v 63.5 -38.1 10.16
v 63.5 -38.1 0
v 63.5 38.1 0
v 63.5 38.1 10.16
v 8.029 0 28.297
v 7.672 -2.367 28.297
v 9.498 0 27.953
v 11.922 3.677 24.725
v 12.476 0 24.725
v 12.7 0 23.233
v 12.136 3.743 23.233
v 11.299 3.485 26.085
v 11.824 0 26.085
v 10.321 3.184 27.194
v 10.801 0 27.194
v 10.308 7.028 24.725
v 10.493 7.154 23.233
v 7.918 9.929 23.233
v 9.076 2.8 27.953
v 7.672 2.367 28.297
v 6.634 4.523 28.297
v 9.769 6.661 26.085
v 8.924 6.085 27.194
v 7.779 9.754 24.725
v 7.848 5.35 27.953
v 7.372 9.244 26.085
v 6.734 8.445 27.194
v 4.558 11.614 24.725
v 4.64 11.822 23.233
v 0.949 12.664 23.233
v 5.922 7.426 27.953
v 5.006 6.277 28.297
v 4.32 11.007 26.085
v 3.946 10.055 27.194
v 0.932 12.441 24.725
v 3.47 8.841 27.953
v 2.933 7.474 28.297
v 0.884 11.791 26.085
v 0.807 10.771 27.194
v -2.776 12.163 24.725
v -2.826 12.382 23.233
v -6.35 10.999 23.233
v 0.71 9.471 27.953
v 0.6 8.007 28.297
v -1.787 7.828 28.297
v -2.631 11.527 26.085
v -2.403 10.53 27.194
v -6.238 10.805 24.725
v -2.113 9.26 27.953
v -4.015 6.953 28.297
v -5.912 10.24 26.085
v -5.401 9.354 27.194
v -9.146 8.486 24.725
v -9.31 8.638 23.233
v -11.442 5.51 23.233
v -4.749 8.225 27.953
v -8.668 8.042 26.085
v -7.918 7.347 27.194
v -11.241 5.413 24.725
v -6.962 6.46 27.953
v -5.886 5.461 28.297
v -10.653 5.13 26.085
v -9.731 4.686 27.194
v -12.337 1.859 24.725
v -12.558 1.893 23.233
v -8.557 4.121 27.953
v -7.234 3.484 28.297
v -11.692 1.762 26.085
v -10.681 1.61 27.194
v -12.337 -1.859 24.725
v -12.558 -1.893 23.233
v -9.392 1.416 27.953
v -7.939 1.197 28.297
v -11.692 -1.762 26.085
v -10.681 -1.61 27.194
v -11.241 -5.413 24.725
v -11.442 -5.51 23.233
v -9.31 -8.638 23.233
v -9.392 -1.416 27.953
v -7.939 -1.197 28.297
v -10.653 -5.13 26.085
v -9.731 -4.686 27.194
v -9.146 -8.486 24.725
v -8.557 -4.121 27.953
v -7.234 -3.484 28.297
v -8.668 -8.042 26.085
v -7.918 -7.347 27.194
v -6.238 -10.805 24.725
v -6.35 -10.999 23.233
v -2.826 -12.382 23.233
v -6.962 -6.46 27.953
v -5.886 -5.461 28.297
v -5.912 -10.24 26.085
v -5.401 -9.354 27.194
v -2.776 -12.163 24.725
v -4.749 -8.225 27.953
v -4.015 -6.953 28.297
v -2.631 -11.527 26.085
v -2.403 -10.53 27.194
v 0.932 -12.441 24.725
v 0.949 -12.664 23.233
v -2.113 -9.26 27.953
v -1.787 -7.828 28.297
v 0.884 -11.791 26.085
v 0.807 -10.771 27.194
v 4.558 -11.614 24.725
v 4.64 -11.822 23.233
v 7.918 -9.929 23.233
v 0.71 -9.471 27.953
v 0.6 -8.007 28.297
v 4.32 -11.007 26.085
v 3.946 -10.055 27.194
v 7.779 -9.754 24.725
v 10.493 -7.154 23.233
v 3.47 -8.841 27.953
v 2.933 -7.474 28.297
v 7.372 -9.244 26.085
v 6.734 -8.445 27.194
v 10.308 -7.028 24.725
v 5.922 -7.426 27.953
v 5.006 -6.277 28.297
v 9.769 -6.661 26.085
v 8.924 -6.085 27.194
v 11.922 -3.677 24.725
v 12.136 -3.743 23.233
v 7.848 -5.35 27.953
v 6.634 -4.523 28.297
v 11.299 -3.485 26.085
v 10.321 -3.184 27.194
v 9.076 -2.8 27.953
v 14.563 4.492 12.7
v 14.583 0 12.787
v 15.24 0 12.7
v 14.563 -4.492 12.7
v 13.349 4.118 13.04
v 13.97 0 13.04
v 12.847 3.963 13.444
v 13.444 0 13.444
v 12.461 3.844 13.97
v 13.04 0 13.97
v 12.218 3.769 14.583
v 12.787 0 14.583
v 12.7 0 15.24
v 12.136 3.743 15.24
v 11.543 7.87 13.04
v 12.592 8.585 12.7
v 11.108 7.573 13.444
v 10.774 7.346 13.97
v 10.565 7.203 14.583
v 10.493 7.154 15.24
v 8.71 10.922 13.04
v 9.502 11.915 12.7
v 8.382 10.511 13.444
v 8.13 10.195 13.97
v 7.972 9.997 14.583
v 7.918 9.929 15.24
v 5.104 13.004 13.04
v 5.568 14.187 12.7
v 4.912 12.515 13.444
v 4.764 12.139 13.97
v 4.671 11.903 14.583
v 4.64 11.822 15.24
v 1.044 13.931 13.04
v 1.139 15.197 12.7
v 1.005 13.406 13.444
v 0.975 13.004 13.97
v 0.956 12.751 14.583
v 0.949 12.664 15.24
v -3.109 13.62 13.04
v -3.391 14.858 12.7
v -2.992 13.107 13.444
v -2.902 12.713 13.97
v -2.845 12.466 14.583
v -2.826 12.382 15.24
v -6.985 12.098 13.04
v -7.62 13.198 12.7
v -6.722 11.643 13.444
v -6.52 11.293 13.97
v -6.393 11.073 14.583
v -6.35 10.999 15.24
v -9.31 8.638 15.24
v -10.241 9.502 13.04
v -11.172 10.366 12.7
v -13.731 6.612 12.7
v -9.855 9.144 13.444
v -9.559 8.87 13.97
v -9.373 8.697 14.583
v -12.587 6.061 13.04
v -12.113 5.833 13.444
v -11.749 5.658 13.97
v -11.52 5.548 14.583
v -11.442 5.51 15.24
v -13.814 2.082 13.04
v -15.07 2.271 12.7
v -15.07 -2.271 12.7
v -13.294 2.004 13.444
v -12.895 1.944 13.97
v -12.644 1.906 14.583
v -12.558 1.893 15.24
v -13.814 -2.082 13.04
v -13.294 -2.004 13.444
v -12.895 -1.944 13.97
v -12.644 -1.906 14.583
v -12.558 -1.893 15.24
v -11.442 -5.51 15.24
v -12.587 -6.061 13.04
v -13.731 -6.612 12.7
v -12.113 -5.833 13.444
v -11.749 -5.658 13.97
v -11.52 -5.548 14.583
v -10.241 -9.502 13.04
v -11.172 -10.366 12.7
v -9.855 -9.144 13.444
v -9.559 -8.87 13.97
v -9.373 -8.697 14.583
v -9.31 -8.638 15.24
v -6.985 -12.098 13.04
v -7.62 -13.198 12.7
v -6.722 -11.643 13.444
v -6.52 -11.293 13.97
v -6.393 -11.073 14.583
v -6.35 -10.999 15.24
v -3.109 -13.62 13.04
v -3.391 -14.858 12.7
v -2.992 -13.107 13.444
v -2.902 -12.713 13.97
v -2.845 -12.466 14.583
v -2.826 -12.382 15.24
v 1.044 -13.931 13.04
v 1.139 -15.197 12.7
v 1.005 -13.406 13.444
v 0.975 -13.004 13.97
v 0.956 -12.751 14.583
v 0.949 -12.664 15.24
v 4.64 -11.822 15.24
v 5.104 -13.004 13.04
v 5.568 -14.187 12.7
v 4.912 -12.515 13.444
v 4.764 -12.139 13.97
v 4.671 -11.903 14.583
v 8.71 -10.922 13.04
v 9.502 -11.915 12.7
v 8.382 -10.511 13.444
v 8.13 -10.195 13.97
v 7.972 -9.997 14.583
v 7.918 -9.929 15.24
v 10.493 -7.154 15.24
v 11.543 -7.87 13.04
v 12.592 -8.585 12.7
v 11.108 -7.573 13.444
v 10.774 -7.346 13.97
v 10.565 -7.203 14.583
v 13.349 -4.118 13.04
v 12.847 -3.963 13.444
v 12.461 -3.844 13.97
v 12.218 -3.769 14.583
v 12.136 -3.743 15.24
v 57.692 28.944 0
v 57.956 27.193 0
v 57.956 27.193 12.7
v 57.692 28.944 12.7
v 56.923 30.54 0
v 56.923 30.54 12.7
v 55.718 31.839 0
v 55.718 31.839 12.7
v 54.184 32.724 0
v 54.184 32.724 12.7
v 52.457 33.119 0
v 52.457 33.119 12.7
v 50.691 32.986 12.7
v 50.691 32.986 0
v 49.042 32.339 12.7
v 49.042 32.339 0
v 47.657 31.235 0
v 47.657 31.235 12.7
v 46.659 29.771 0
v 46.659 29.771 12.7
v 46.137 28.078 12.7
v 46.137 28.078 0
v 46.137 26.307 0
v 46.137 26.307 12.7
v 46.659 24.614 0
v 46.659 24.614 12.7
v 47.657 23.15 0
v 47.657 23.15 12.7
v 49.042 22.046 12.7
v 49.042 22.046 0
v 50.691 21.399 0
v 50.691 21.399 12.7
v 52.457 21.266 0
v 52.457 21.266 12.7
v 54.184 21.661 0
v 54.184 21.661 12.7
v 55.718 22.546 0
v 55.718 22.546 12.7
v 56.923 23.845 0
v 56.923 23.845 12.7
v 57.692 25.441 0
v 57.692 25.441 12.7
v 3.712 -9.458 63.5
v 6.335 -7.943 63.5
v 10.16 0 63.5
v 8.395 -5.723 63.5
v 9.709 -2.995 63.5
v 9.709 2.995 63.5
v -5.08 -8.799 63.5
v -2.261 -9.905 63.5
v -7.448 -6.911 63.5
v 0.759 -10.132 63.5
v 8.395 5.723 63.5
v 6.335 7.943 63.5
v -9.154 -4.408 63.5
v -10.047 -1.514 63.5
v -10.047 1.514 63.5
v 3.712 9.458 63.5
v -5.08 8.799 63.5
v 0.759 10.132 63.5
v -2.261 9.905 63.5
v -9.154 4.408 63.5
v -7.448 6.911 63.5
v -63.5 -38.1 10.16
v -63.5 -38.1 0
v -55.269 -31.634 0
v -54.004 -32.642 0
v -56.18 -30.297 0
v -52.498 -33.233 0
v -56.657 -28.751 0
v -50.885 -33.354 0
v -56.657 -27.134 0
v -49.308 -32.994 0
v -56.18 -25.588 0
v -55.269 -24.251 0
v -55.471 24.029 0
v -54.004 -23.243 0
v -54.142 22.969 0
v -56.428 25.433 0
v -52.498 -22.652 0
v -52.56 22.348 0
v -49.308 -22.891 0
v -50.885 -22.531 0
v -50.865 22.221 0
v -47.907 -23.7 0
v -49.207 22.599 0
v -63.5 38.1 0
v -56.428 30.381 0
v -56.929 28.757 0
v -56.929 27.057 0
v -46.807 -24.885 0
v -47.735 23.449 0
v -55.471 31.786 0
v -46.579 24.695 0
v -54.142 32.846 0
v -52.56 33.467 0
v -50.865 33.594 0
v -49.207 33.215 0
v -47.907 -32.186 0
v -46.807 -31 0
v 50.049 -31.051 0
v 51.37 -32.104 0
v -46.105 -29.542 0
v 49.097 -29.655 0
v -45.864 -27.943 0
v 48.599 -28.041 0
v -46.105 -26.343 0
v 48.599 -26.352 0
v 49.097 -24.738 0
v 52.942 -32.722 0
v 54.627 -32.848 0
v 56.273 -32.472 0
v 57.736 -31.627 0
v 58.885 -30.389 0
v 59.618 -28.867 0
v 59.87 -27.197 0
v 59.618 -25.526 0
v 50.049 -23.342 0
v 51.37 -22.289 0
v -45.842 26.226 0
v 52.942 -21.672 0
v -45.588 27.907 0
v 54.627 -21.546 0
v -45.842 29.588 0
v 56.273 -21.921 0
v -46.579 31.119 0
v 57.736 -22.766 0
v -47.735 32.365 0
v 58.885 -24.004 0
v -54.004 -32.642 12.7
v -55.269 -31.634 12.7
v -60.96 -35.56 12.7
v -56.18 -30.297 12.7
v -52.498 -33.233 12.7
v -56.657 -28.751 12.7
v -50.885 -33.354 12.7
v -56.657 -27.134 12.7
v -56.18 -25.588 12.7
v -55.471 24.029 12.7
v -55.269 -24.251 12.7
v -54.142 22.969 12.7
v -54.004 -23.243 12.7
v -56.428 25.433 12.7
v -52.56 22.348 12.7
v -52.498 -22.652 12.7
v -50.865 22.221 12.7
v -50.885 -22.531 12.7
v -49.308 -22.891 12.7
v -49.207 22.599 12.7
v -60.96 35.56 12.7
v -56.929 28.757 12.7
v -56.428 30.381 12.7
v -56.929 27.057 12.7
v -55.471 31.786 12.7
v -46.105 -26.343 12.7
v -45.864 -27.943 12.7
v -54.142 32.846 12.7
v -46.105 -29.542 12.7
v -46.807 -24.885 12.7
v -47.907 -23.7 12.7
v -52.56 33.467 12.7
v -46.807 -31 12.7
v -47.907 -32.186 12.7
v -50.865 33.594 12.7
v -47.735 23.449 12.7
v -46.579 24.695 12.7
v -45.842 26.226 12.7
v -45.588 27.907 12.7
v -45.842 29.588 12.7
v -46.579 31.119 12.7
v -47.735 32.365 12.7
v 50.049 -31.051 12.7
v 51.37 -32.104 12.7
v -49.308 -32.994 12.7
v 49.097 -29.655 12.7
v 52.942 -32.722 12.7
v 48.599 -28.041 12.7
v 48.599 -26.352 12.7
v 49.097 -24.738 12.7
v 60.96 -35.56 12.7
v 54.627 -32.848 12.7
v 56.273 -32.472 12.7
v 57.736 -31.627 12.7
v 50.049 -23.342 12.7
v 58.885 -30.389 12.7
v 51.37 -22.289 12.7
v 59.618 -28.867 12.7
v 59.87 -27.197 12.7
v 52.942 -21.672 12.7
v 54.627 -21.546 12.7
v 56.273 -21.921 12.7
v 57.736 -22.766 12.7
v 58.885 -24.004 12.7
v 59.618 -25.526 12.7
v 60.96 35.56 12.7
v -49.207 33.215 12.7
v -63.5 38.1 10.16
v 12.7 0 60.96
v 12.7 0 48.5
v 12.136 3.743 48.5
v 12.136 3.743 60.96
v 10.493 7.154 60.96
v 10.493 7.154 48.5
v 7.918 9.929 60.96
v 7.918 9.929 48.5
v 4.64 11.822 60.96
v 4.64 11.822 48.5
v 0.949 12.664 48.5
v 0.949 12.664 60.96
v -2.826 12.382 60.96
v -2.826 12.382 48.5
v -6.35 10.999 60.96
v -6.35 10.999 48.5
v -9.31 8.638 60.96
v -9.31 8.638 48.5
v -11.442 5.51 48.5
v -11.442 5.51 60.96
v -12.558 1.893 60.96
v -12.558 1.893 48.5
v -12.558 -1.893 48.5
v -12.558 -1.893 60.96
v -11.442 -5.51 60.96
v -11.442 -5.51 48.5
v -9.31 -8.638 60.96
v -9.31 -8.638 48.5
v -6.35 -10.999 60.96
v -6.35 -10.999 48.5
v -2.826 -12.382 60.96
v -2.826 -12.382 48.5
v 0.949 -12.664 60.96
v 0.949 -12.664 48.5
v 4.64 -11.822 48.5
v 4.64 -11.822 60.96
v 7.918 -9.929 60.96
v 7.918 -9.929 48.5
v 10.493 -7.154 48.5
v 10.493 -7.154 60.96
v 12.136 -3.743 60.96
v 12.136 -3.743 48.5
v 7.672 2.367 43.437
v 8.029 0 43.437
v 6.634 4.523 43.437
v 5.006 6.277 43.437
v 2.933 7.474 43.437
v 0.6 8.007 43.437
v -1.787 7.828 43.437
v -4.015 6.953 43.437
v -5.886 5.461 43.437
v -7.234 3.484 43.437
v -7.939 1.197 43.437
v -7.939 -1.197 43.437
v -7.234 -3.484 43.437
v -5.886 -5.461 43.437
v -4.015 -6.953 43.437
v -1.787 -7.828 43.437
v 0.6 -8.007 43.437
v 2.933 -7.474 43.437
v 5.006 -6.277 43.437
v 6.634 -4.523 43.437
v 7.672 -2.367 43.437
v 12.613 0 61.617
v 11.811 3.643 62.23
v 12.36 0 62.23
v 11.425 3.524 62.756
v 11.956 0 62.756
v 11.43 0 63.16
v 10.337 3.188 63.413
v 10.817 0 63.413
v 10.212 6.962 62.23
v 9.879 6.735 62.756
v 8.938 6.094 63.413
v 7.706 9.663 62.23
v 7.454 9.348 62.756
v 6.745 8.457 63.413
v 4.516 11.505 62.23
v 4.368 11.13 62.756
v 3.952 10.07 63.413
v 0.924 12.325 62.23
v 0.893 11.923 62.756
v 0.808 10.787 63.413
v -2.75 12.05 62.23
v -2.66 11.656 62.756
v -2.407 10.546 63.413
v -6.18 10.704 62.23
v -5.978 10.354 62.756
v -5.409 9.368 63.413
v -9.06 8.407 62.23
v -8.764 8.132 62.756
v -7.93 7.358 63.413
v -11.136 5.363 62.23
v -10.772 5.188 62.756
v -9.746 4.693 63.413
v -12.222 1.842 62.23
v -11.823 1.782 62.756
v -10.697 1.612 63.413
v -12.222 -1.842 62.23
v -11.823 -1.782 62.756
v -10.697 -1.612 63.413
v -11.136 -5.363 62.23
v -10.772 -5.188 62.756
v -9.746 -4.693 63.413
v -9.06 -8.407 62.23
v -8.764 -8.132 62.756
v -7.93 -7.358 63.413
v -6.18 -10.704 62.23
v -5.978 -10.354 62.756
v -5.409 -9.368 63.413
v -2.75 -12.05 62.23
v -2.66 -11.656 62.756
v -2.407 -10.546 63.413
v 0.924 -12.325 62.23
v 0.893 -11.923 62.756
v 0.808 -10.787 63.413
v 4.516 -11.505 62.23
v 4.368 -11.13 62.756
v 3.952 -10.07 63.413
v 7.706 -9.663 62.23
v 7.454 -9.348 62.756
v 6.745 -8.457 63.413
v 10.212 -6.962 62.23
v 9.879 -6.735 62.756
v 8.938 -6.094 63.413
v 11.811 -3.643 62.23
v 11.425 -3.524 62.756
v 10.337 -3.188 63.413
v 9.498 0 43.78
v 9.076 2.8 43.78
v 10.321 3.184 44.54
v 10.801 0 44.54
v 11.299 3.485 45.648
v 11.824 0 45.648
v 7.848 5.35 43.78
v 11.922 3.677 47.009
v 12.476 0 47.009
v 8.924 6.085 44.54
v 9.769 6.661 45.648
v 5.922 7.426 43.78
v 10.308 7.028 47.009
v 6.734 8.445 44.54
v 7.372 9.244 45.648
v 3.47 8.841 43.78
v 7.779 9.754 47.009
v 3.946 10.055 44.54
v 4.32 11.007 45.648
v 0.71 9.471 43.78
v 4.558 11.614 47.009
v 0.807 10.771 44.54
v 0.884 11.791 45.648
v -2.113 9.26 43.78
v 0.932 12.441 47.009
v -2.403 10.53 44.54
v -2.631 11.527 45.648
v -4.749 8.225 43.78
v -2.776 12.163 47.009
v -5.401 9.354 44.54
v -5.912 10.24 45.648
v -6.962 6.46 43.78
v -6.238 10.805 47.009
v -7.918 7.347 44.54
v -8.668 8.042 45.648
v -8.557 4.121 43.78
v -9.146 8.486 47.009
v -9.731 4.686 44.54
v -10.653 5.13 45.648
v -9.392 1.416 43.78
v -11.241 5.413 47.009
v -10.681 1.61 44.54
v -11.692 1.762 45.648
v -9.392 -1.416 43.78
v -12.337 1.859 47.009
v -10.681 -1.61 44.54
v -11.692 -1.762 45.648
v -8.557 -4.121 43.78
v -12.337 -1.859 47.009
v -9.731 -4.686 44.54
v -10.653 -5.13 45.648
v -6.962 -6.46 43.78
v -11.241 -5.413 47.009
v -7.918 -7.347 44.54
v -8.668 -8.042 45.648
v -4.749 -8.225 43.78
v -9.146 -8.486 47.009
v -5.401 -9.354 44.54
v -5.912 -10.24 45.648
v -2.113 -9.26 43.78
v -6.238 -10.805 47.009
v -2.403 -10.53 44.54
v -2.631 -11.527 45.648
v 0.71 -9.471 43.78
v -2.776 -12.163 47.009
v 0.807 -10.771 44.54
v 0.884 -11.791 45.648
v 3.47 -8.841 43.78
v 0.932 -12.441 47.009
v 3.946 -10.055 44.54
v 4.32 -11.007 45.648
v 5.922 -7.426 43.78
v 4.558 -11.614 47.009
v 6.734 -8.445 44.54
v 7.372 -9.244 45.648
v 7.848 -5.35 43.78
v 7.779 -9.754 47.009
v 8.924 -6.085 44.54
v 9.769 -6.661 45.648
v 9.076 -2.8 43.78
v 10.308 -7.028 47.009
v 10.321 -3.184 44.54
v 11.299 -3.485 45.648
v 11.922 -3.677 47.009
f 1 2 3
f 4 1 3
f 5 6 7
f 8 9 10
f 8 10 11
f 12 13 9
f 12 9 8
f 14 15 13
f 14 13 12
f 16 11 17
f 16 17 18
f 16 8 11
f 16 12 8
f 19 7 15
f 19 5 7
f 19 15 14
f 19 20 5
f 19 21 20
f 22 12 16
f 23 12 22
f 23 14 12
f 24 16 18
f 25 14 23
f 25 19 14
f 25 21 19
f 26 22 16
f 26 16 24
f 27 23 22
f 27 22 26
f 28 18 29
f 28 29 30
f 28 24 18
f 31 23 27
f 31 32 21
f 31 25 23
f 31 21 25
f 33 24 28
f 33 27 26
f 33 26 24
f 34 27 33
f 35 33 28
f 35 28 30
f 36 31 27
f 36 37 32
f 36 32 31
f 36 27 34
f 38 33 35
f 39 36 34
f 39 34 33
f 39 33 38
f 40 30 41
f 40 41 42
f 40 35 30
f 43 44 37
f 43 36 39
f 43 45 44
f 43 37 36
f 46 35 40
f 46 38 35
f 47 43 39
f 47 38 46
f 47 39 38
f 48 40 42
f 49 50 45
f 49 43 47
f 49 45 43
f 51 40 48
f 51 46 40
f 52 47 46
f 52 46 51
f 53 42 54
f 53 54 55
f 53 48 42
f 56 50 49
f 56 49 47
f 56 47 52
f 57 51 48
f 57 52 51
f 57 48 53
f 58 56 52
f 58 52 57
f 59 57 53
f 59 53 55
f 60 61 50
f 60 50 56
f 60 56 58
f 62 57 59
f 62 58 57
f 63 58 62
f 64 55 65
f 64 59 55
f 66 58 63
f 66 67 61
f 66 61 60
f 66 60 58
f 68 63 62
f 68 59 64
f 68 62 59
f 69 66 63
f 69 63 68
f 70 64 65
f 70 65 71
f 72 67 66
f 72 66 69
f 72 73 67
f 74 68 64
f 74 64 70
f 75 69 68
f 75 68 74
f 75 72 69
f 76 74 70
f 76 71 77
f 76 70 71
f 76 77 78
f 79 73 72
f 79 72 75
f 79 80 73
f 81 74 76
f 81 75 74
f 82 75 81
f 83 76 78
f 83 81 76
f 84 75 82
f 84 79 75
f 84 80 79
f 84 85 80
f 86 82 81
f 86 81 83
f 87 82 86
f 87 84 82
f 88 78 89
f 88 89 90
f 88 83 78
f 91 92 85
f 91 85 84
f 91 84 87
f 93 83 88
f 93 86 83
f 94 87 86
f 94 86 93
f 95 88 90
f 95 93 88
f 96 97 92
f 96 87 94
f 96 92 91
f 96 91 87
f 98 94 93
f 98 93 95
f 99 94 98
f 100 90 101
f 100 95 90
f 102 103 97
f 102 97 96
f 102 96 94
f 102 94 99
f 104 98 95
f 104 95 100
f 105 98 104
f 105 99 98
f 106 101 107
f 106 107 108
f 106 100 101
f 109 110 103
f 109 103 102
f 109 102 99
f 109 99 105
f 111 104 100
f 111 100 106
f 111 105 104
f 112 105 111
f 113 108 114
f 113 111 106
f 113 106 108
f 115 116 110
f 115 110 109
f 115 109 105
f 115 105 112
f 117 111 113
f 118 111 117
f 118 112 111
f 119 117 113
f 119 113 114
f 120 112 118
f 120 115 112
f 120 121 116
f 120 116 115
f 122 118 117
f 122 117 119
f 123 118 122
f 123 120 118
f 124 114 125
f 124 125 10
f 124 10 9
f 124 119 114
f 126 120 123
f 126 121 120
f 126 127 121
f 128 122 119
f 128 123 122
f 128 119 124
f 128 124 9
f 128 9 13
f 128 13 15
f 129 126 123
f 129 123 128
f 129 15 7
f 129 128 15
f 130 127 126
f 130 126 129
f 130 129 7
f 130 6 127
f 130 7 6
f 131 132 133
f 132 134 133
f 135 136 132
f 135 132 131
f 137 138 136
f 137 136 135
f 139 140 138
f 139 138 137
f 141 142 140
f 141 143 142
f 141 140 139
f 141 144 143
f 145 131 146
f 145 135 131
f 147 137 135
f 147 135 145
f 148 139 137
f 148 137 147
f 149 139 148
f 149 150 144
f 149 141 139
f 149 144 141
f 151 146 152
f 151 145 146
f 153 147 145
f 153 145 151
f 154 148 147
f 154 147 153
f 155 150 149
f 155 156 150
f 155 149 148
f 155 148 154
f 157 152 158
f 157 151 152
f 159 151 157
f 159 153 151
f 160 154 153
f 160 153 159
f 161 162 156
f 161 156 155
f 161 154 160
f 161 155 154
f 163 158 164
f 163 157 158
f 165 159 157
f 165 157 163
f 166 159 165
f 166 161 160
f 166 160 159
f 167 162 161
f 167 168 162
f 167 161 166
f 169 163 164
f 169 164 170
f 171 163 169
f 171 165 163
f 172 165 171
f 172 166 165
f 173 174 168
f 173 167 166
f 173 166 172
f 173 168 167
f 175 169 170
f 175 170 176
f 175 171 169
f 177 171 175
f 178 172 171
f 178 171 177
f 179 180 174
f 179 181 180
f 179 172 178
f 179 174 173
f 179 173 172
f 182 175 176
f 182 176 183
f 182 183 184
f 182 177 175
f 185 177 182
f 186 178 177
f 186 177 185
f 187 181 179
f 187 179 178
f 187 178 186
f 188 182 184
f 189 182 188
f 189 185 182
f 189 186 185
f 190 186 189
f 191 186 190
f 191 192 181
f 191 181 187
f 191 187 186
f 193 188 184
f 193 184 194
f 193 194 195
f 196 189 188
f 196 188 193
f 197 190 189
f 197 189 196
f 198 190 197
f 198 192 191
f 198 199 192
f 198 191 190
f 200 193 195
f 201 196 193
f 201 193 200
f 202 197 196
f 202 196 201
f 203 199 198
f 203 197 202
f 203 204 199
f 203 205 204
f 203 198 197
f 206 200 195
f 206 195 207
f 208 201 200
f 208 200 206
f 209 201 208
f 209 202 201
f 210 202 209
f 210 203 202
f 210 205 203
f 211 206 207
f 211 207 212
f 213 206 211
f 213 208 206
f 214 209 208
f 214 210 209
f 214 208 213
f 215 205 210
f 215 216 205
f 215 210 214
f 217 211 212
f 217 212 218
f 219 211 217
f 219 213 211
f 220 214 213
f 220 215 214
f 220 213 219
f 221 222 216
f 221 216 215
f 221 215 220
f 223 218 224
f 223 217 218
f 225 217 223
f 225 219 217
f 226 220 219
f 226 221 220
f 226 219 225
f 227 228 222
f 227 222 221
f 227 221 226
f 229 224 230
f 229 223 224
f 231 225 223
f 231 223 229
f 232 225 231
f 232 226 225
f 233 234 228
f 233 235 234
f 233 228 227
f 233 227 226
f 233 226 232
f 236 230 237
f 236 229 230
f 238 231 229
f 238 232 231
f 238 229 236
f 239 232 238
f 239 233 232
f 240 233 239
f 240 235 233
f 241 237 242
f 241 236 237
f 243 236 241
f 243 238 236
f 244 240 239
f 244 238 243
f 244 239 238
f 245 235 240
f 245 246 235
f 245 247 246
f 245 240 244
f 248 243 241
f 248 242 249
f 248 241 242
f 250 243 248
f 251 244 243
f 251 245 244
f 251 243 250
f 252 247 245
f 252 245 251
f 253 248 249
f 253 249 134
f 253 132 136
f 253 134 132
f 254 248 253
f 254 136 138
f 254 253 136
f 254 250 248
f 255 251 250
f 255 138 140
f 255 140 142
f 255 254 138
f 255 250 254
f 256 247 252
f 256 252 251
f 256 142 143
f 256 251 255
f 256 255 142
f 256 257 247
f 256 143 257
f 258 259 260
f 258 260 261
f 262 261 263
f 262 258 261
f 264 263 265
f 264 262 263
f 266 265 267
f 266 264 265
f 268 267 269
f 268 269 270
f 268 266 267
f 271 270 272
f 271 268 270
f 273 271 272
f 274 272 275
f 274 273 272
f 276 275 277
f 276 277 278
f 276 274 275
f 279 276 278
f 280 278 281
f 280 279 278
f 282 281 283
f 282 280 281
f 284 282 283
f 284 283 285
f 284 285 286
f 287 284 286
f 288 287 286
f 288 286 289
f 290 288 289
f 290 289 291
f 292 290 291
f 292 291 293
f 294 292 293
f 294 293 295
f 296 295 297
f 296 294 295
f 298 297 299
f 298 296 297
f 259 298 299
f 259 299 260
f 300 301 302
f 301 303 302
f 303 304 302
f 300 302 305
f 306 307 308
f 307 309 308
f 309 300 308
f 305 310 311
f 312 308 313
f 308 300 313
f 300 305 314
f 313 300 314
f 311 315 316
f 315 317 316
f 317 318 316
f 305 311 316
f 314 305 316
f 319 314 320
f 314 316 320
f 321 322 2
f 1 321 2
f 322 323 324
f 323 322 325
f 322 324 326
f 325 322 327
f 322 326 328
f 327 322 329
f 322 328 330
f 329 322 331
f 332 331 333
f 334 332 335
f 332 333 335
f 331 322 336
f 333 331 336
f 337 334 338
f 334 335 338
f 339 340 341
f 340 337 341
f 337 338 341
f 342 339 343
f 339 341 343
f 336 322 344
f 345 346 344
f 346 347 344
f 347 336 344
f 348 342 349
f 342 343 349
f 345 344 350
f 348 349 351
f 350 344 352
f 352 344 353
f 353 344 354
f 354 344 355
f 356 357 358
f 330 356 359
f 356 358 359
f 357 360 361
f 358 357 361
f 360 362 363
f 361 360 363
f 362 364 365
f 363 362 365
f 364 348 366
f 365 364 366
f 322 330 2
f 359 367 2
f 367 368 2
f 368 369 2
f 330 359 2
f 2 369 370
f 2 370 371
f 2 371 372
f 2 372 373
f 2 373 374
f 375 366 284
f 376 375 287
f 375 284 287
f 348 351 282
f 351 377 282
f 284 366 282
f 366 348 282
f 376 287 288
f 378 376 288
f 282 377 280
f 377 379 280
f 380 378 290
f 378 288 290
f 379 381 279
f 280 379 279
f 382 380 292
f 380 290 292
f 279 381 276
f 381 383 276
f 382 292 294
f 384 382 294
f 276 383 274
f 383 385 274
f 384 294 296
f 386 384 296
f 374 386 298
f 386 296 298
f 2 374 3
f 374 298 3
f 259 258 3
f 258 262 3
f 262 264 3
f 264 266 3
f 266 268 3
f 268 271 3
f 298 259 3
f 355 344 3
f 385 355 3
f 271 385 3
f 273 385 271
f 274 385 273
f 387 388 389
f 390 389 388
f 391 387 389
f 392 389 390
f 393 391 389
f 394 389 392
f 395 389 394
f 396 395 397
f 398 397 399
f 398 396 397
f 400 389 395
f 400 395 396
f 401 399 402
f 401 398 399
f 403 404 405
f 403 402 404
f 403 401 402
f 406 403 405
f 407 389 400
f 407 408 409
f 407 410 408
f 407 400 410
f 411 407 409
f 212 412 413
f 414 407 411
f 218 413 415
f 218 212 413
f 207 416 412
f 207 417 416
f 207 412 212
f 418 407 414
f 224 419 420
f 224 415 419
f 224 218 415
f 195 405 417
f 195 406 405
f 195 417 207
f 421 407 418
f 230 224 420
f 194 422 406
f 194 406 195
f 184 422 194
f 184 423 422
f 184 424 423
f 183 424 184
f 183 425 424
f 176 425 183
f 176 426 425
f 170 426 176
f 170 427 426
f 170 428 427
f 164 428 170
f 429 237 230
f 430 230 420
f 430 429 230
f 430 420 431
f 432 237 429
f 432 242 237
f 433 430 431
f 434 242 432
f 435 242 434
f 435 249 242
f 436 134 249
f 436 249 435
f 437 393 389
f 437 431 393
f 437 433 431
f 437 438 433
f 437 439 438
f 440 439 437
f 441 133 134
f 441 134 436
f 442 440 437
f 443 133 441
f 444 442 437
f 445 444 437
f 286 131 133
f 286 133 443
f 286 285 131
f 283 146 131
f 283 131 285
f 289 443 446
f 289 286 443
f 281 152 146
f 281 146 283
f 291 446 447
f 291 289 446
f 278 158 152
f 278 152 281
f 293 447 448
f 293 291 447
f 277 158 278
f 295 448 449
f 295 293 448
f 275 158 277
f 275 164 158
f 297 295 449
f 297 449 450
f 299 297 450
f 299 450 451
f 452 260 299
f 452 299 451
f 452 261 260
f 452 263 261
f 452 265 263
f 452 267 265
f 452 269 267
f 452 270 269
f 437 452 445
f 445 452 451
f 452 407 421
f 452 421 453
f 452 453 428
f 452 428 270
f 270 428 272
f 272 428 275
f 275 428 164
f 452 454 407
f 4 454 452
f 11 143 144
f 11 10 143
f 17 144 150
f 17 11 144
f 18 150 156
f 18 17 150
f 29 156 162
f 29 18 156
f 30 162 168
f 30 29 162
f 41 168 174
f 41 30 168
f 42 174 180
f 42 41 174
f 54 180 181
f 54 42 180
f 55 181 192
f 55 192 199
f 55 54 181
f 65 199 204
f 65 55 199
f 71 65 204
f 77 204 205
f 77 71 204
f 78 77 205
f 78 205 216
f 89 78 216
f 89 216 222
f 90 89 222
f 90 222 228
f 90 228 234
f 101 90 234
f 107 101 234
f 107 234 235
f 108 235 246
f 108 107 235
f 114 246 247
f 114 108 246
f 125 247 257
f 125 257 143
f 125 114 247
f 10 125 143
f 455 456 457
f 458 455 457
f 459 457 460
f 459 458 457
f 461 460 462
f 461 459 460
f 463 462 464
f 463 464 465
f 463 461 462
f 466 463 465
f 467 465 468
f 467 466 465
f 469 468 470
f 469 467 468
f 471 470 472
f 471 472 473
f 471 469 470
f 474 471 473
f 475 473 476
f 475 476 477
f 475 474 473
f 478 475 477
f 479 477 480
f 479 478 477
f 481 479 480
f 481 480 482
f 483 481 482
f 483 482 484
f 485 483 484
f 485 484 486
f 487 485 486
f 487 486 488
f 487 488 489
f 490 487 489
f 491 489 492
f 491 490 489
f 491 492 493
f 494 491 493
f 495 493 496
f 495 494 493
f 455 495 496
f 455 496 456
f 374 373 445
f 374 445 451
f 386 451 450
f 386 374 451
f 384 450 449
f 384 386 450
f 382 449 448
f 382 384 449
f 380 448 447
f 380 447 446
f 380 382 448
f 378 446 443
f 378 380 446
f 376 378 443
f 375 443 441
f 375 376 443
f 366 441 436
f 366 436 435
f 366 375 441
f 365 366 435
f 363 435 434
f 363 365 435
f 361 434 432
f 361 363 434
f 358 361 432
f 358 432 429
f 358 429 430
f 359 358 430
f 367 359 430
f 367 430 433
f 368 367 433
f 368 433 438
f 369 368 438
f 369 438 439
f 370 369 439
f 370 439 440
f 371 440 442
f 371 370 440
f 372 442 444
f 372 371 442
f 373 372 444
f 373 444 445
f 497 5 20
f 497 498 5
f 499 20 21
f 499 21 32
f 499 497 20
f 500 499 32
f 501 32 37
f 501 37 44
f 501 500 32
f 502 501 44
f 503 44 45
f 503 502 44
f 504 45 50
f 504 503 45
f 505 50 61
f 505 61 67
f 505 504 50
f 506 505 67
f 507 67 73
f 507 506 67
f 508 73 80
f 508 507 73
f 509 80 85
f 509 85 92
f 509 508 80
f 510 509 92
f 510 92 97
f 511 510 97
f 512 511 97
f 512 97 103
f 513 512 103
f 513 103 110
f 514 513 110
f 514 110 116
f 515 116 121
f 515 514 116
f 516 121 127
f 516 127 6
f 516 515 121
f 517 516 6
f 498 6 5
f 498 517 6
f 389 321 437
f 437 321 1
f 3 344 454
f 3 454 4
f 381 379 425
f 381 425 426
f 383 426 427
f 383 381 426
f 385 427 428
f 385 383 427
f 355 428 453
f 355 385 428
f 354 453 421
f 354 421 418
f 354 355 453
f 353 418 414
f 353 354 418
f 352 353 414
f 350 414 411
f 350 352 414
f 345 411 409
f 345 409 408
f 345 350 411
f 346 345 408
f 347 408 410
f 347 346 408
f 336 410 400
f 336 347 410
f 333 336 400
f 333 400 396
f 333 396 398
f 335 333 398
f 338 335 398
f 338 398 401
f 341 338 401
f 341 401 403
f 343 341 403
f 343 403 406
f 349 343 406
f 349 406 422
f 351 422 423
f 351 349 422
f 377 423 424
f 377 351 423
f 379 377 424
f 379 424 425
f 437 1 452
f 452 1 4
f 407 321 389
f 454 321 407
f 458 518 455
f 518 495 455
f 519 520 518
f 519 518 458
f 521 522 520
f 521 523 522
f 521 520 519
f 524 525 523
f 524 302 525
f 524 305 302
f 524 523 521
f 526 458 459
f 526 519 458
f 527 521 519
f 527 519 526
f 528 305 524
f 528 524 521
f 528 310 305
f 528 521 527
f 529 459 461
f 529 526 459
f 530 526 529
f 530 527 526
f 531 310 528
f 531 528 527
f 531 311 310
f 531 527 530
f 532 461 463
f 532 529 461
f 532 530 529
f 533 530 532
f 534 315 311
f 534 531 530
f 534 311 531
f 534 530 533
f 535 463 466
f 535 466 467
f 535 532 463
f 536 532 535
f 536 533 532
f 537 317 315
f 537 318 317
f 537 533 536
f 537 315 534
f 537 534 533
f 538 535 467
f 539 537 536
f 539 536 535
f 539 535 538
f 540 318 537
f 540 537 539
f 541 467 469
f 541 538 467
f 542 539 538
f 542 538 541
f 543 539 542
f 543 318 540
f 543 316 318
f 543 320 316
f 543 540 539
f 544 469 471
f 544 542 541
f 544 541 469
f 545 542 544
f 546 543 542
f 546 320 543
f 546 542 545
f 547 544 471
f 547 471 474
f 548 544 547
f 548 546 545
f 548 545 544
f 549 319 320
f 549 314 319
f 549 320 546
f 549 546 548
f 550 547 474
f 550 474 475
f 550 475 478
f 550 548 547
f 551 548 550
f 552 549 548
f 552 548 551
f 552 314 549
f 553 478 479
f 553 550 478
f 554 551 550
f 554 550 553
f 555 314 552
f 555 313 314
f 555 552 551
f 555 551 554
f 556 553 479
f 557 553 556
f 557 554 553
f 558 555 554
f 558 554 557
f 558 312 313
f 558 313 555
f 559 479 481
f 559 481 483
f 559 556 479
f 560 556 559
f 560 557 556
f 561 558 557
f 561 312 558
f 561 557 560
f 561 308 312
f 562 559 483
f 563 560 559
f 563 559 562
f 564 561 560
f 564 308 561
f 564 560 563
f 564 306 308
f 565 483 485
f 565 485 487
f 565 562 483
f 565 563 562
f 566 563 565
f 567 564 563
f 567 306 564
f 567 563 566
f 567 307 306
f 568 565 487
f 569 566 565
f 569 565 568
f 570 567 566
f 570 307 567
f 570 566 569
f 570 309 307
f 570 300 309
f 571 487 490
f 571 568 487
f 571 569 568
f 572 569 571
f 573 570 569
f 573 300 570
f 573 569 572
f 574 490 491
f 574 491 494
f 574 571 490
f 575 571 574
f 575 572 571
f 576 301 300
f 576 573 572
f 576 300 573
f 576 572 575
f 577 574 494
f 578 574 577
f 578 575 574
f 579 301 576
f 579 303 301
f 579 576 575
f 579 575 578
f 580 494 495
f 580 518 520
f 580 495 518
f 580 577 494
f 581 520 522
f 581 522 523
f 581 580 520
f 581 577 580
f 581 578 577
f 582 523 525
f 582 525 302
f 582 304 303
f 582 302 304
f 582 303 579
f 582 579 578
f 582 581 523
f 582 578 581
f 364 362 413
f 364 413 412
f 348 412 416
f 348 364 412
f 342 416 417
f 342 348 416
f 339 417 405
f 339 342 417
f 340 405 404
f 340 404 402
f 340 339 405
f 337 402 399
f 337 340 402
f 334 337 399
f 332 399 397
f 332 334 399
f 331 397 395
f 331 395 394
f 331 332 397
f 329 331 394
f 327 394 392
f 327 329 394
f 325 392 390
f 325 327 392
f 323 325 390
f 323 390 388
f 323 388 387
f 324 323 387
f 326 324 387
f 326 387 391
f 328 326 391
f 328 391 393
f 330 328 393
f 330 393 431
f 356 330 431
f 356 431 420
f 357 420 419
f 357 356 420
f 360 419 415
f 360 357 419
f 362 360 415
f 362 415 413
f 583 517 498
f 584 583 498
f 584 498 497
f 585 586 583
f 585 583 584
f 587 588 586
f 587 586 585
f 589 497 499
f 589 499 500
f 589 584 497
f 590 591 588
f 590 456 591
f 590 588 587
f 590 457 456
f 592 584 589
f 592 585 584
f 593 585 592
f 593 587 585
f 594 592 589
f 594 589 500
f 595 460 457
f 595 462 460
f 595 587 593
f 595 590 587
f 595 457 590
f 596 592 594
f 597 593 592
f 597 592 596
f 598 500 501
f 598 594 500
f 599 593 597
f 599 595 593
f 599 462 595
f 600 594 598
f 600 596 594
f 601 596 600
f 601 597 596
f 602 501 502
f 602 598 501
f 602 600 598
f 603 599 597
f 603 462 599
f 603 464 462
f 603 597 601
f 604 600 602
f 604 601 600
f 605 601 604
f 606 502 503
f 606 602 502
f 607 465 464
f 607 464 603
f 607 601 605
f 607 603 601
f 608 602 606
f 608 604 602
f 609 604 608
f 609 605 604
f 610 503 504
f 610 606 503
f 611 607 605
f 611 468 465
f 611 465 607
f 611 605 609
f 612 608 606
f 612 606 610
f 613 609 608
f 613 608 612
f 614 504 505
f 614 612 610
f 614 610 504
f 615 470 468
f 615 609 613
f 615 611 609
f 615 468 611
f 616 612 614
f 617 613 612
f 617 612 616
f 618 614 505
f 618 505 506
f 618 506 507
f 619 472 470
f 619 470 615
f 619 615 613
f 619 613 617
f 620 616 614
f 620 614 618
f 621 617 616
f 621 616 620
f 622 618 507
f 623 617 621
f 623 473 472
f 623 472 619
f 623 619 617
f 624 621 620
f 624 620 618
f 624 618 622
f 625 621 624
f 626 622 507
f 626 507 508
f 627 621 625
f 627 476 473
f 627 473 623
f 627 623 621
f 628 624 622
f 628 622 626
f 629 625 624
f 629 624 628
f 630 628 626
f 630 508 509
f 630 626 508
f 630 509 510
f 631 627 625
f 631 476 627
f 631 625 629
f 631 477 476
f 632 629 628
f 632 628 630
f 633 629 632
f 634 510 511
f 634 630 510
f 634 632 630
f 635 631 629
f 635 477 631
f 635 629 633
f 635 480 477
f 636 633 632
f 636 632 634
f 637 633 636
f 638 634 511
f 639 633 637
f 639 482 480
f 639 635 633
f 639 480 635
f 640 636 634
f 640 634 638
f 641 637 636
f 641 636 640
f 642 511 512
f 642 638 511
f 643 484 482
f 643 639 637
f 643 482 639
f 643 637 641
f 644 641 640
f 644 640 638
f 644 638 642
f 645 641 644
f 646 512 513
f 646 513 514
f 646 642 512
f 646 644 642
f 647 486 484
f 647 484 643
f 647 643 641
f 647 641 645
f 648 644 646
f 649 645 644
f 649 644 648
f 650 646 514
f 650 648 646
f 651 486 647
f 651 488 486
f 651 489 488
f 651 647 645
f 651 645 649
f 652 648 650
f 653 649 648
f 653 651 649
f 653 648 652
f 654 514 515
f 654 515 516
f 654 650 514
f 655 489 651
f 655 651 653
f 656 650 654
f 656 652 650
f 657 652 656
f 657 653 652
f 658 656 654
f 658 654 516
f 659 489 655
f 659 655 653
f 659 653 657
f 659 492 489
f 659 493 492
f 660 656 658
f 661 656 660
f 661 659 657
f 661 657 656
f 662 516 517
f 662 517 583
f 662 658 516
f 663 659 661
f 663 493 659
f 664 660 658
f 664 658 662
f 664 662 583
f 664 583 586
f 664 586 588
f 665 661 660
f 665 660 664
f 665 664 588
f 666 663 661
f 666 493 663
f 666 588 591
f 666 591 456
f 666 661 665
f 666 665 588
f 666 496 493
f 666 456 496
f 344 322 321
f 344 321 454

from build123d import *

# Parameters (mm, degrees)
F0_W     = 127
F0_H     = 76.2
F1_DEPTH = 12.7
F2_R     = 5.9427105428
F2_R_2   = 5.6670127921
F2_R_3   = 5.7023762048
F2_R_4   = 5.4269658504
F3_DEPTH = 12.7
F4_W     = 12.7
F4_H     = 50.8
F6_W     = 9.3170334585
F6_H     = 15.1401739568
F8_R     = 2.54
F9_SIZE  = 2.54


# Not quite as in the source:
# - a fillet or chamfer that OpenCascade refuses, or shapes differently, is made with other operations: its cross-section is extruded or revolved along the edge and cut away or added


with BuildPart() as f1:
    # F0 (on Top) → F1 (new body)
    with BuildSketch(Plane.XY):
        Rectangle(F0_W, F0_H)
    extrude(amount=F1_DEPTH)

    # F2 (on Top) → F3 (cut)
    with BuildSketch(Plane.XY):
        with Locations((52.0129092038, 27.1925590932)):
            Circle(F2_R)
        with Locations((54.2030967772, -27.1966736764)):
            Circle(F2_R_2)
        with Locations((-51.2907654047, 27.9071591794)):
            Circle(F2_R_3)
        with Locations((-51.2907616794, -27.9425289482)):
            Circle(F2_R_4)
    extrude(amount=F3_DEPTH, mode=Mode.SUBTRACT)

    # F4 (on Front) → F5 (revolve)
    with BuildSketch(Plane.XZ):
        with Locations((6.35, 38.1)):
            Rectangle(F4_W, F4_H)
    revolve(axis=Axis((0, 0, 38.1), (0, 0, 1)))

    # F6 (on Front) → F7 (revolve, cut)
    with BuildSketch(Plane.XZ):
        with Locations((12.6875618007, 35.8667755499)):
            Rectangle(F6_W, F6_H)
    revolve(axis=Axis((0, 0, 12.7), (0, 0, 1)), mode=Mode.SUBTRACT)

    # F8
    f8_edges = [f1.edges().sort_by_distance(p)[0] for p in [
        (-12.7, 0, 63.5),
        (-12.7, 0, 12.7),
    ]]
    fillet(f8_edges, radius=F8_R)

    # F9
    f9_edges = [f1.edges().sort_by_distance(p)[0] for p in [
        (0, -38.1, 12.7),
        (0, 38.1, 12.7),
        (63.5, 0, 12.7),
        (-63.5, 0, 12.7),
    ]]
    chamfer(f9_edges, length=F9_SIZE)

    # F10: fillet of radius 5.08 on 2 edges, made by hand

    # F10_s1 → F10_t2 (revolve, cut)
    with BuildSketch(Plane.XZ):
        with BuildLine():
            ThreePointArc((8.0290450715, 43.4368625283), (11.3539221311, 45.0559189466), (12.7, 48.5003674537))
            Line((12.7, 48.5003674537), (12.7, 43.4368625283))
            Line((12.7, 43.4368625283), (8.0290450715, 43.4368625283))
        make_face()
    revolve(axis=Axis((0, 0, 43.4368625283), (0, 0, 1)), mode=Mode.SUBTRACT)

    # F10_s3 → F10_t4 (revolve, cut)
    with BuildSketch(Plane.XZ):
        with BuildLine():
            ThreePointArc((12.7, 23.2331836462), (11.3539221311, 26.6776321533), (8.0290450715, 28.2966885716))
            Line((8.0290450715, 28.2966885716), (12.7, 28.2966885716))
            Line((12.7, 28.2966885716), (12.7, 23.2331836462))
        make_face()
    revolve(axis=Axis((0, 0, 28.2966885716), (0, 0, 1)), mode=Mode.SUBTRACT)


solid = f1.part
